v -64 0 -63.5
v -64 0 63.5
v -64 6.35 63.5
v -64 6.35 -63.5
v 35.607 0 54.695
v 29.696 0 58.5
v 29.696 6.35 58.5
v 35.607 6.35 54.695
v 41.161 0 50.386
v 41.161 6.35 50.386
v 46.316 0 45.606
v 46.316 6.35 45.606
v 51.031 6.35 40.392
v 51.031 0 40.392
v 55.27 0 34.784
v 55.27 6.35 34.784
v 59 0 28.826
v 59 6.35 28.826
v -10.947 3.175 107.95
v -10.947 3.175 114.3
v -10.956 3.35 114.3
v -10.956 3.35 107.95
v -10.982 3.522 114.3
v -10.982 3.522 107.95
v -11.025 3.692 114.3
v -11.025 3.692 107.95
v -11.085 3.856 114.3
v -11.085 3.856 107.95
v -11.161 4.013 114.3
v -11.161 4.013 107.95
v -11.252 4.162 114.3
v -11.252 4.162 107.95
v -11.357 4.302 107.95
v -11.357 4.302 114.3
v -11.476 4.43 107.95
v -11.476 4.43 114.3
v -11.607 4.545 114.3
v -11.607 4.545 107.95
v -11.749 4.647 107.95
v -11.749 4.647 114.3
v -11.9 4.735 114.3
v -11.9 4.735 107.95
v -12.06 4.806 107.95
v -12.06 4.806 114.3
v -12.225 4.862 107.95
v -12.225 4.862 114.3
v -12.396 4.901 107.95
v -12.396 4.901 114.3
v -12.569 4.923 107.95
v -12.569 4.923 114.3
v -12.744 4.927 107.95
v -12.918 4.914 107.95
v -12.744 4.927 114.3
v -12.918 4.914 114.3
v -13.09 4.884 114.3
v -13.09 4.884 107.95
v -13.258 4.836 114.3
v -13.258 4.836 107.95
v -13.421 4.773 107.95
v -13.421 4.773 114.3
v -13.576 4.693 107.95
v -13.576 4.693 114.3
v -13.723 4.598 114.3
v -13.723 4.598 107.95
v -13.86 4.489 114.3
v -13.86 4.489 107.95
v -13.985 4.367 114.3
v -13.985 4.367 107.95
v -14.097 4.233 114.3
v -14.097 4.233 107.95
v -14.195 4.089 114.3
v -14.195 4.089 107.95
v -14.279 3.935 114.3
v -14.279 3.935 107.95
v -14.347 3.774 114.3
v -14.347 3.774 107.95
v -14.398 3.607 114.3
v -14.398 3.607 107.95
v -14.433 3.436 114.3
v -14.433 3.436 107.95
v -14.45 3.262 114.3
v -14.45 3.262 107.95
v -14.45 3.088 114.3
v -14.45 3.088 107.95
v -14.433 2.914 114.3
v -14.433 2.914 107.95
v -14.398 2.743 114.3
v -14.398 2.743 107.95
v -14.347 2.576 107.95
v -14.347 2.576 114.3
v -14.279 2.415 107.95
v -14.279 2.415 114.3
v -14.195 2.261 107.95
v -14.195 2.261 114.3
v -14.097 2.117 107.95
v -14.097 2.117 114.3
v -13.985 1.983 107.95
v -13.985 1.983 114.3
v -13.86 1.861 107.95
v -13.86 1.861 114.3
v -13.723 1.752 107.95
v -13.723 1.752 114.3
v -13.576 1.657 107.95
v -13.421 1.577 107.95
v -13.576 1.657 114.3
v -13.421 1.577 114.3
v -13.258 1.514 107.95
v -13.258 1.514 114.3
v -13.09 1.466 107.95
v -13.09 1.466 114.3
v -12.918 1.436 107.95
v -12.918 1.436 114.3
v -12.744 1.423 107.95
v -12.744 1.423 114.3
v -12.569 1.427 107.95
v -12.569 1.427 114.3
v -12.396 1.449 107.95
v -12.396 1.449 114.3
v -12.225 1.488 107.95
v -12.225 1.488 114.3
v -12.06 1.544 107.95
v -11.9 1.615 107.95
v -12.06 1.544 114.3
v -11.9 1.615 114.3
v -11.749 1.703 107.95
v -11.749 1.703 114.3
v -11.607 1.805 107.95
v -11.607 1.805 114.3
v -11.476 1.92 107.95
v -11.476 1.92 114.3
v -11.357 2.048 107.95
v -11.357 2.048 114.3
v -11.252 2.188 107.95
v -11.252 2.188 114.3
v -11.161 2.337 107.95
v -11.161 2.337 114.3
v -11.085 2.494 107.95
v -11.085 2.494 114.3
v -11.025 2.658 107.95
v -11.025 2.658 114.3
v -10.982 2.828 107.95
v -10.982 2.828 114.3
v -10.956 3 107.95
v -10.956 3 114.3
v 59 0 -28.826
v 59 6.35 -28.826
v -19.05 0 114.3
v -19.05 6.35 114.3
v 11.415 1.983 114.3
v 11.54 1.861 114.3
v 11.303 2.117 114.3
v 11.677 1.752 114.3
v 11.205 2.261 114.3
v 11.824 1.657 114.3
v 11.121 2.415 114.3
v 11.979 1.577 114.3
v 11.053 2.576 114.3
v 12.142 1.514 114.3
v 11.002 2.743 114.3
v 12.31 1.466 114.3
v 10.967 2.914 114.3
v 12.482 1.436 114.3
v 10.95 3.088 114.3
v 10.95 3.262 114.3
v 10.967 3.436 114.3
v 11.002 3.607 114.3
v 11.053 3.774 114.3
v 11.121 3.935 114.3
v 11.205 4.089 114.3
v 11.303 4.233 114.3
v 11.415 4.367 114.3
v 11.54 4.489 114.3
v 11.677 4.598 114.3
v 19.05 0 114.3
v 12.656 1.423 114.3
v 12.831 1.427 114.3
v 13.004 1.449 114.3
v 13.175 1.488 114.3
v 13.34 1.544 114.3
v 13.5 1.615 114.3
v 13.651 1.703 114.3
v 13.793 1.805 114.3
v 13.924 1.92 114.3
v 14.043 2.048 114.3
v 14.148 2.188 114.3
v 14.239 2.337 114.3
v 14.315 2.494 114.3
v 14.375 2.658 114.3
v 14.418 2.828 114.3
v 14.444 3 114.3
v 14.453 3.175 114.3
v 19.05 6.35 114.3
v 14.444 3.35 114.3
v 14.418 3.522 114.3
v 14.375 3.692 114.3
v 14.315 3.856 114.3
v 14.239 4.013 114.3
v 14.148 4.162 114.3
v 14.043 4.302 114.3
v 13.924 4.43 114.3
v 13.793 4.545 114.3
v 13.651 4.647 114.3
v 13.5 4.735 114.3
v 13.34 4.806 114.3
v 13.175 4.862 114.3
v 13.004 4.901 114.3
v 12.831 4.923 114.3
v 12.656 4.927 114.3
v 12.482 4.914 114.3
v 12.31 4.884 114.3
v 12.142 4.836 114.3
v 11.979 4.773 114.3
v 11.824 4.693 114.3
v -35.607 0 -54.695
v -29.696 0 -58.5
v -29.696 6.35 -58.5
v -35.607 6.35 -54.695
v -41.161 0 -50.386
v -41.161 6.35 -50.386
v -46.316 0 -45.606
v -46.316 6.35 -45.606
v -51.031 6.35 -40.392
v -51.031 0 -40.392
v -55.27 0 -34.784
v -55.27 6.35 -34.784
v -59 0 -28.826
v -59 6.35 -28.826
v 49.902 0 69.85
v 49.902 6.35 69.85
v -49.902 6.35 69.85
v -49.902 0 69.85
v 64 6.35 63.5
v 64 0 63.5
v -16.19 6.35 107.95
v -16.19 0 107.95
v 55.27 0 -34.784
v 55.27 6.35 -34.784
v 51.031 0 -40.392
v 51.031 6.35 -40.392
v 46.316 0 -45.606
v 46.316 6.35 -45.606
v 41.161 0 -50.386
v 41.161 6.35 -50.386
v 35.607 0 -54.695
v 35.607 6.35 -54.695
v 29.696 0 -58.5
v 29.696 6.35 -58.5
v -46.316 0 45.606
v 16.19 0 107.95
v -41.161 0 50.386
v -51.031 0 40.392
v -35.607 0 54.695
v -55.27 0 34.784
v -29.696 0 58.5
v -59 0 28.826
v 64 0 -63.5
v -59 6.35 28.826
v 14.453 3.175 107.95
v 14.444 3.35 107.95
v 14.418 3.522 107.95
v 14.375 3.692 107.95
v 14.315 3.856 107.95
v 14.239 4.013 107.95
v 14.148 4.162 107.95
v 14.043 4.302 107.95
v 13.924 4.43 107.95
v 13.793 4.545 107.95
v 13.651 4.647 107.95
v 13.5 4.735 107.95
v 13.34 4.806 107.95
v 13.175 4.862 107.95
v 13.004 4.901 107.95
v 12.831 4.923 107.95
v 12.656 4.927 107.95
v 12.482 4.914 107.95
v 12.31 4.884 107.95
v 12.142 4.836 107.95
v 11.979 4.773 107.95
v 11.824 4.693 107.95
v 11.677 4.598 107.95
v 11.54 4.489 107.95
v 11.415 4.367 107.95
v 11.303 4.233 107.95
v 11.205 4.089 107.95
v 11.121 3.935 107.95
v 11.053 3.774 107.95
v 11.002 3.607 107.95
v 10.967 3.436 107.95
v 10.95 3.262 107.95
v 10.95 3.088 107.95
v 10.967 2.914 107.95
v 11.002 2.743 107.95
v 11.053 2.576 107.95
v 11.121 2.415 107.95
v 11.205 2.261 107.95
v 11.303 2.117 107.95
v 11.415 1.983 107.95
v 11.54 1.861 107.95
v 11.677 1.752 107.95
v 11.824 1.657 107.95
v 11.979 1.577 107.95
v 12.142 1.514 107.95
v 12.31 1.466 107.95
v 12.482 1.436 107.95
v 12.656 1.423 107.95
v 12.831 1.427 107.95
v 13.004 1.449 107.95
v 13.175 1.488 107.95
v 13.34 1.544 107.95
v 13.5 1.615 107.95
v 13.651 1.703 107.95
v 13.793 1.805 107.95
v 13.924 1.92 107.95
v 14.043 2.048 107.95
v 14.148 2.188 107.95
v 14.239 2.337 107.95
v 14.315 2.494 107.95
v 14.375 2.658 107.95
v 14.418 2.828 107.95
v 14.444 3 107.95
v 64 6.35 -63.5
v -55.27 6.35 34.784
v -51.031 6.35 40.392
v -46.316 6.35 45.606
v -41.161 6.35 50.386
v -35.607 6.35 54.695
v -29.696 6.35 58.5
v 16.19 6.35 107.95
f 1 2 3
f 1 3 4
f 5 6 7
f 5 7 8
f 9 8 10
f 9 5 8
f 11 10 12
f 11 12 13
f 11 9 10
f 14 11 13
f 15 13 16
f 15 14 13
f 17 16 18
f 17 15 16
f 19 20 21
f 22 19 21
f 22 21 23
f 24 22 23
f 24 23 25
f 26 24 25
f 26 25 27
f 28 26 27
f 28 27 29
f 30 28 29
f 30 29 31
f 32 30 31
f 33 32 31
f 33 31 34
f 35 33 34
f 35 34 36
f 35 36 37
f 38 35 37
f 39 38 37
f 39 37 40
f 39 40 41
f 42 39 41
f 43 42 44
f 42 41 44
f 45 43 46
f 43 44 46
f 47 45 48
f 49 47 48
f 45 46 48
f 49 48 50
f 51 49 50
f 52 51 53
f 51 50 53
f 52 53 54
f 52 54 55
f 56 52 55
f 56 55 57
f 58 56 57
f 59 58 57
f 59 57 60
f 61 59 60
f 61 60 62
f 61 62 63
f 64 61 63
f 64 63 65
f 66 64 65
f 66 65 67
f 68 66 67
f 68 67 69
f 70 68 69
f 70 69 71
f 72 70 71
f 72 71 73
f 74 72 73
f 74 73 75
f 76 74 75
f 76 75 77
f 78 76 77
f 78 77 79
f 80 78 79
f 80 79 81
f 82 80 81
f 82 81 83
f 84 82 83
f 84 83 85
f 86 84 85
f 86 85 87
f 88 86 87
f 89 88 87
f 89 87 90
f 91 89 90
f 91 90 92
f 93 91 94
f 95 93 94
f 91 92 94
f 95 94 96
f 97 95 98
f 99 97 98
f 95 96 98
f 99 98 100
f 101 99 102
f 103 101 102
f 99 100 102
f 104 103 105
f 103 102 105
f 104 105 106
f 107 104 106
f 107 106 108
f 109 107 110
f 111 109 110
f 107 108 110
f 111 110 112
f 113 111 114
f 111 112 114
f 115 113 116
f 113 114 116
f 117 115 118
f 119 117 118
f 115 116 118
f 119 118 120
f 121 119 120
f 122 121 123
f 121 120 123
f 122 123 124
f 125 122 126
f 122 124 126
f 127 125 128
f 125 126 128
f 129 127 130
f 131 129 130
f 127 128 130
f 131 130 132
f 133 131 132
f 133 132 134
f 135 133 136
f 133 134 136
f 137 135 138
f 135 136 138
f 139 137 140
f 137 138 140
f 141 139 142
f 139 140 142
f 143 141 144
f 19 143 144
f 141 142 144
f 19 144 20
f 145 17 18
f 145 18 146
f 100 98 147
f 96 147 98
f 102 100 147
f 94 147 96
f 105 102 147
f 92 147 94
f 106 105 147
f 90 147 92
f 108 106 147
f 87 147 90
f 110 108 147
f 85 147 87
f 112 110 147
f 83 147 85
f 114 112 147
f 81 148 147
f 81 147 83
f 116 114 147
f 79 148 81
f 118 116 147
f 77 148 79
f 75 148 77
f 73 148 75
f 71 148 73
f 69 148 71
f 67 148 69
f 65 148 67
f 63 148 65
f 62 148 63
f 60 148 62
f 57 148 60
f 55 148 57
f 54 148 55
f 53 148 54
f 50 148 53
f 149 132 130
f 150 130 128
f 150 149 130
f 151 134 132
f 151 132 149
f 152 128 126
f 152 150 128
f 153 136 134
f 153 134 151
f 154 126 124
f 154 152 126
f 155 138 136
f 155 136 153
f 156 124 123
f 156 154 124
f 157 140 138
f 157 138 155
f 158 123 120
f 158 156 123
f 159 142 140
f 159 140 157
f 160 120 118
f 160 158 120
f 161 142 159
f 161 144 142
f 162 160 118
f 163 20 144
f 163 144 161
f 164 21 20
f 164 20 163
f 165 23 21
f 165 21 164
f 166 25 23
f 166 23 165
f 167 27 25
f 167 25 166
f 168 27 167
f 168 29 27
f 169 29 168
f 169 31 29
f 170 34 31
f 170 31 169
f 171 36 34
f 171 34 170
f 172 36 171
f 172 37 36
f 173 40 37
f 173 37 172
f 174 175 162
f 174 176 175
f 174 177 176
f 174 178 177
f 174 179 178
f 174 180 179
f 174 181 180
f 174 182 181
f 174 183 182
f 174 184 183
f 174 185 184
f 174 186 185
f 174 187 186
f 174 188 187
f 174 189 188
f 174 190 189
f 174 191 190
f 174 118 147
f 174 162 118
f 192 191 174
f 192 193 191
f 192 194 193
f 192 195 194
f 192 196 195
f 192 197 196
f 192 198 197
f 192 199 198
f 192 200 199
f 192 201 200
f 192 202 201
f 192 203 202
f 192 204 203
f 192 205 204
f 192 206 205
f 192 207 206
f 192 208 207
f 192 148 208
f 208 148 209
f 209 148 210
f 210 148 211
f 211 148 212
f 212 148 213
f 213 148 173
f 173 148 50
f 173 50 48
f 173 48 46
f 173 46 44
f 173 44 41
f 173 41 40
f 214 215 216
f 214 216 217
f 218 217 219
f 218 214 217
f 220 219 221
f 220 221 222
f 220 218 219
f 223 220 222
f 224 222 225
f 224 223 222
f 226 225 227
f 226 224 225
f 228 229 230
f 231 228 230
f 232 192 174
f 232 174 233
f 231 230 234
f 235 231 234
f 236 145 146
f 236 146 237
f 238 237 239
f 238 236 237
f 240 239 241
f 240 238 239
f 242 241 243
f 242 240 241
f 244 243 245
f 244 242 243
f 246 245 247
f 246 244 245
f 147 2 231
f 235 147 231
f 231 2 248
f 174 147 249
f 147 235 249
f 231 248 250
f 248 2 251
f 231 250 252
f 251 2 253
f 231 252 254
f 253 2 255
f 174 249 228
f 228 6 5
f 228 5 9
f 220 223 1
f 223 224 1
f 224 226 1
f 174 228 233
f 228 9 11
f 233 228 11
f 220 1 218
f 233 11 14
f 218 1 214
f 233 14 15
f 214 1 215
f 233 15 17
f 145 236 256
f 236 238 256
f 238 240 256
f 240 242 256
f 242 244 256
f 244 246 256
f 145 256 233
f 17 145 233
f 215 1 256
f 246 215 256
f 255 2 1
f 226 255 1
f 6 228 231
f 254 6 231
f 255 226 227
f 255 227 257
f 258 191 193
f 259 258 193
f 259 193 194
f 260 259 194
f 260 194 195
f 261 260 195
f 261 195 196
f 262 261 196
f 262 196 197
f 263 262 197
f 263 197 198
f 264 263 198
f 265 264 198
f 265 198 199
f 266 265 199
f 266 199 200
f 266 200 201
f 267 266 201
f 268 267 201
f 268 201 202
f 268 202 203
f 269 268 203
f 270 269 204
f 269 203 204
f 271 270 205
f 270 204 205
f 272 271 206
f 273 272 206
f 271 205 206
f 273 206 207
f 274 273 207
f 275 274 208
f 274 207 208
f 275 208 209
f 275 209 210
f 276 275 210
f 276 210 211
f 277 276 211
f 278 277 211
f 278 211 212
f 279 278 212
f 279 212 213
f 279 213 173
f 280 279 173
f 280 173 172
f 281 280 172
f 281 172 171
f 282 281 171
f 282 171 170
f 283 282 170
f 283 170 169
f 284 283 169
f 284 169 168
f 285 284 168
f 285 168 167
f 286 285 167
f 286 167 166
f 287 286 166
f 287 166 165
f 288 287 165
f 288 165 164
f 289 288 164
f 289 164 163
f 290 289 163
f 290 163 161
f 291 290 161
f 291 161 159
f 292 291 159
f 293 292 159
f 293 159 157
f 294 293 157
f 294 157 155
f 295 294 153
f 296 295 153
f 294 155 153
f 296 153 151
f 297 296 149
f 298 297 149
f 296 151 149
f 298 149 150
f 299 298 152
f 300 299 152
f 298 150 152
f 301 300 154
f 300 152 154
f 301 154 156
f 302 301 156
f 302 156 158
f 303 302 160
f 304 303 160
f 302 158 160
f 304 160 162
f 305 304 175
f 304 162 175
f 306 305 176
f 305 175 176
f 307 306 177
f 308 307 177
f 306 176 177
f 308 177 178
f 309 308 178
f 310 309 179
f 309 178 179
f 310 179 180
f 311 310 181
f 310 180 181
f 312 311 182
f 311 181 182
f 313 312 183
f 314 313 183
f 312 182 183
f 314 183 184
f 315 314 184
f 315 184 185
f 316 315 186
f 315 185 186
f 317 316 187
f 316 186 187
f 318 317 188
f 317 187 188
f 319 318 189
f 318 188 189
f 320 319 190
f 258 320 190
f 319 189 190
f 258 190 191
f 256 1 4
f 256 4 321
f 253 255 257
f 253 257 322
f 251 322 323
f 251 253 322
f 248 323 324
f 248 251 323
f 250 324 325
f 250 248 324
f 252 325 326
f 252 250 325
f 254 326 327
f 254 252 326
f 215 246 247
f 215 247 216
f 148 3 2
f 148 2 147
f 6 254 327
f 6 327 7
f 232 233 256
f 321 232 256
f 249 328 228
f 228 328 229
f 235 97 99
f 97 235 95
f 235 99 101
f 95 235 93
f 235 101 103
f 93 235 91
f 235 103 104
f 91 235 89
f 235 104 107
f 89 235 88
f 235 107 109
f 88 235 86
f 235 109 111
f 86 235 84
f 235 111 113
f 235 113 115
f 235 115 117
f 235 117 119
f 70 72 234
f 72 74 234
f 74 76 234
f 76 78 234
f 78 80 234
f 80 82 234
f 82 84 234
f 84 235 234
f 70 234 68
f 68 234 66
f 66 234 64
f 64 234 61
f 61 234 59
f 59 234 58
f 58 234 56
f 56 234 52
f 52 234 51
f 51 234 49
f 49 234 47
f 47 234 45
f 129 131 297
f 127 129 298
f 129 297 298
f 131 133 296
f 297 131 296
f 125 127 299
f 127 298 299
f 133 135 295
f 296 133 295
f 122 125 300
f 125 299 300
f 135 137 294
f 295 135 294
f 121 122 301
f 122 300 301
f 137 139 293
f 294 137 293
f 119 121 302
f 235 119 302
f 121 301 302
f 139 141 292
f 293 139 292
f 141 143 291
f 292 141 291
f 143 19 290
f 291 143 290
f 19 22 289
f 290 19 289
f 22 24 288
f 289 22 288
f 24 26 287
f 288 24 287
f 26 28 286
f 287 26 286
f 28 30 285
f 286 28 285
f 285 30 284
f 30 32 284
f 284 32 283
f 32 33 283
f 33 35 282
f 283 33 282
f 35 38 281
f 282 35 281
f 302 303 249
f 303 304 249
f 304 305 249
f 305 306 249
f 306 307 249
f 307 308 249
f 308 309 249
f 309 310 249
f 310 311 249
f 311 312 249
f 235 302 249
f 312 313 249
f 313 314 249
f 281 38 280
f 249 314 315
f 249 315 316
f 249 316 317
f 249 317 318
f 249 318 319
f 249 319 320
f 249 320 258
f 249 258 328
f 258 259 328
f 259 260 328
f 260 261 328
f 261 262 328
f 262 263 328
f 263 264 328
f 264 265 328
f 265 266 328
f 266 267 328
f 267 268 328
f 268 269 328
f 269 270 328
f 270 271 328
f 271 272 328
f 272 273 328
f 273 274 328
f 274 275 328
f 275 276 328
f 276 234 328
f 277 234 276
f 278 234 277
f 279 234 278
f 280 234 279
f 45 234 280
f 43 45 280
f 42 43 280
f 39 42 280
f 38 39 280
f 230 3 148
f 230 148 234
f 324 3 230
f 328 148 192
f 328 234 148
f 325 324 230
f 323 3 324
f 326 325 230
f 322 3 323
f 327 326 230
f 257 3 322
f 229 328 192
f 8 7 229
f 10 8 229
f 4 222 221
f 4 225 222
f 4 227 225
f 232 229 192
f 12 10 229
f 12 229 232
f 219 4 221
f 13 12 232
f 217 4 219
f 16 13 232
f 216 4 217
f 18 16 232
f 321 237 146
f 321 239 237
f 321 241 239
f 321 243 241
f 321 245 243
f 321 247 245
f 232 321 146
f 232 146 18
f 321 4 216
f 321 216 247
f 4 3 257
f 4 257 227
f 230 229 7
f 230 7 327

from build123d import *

# Parameters (mm, degrees)
SKETCH2_W                       = 128
SKETCH2_H                       = 127
BOSS_EXTRUDE1_DEPTH             = 6.35
BOSS_EXTRUDE2_DEPTH             = 6.35
F_6_32_TAPPED_HOLE1_D           = 2.7051
F_6_32_TAPPED_HOLE1_DEPTH       = 9.398
F_6_32_TAPPED_HOLE1_CBORE_D     = 3.5052
F_6_32_TAPPED_HOLE1_CBORE_DEPTH = 7.112
F_6_32_TAPPED_HOLE1_TIP         = 0.81269403


with BuildPart() as part:
    # Sketch2 → Boss-Extrude1 (new body)
    with BuildSketch(Plane(origin=(0, 0, 0), x_dir=(1, 0, 0), z_dir=(0, 1, 0))):
        Rectangle(SKETCH2_W, SKETCH2_H)
        with BuildLine():
            Line((29.695725746, 58.5), (-29.695725746, 58.5))
            ThreePointArc((-29.695725746, 58.5), (-46.315550876, 45.606106313), (-59, 28.825884855))
            Line((-59, 28.825884855), (-59, -28.825884855))
            ThreePointArc((-59, -28.825884855), (-46.315550876, -45.606106313), (-29.695725746, -58.5))
            Line((-29.695725746, -58.5), (29.695725746, -58.5))
            ThreePointArc((29.695725746, -58.5), (46.315550876, -45.606106313), (59, -28.825884855))
            Line((59, -28.825884855), (59, 28.825884855))
            ThreePointArc((59, 28.825884855), (46.315550876, 45.606106313), (29.695725746, 58.5))
        make_face(mode=Mode.SUBTRACT)
    extrude(amount=BOSS_EXTRUDE1_DEPTH)

    # Sketch3 → Boss-Extrude2 (add)
    with BuildSketch(Plane(origin=(0, 6.35, 0), x_dir=(1, 0, 0), z_dir=(0, 1, 0))):
        Polygon((-64, -63.5), (-19.05, -114.3), (19.05, -114.3), (64, -63.5), align=None)
        Polygon((-49.902284759, -69.85), (-16.189784759, -107.95), (16.189784759, -107.95), (49.902284759, -69.85), align=None, mode=Mode.SUBTRACT)
    extrude(amount=-BOSS_EXTRUDE2_DEPTH)

    # #6-32 Tapped Hole1
    with Locations(Plane.XY.offset(114.3)):
        with Locations((-12.7, 3.175), (12.7, 3.175)):
            CounterBoreHole(F_6_32_TAPPED_HOLE1_D / 2, F_6_32_TAPPED_HOLE1_CBORE_D / 2, F_6_32_TAPPED_HOLE1_CBORE_DEPTH, depth=F_6_32_TAPPED_HOLE1_DEPTH)
            with Locations((0, 0, -(F_6_32_TAPPED_HOLE1_DEPTH + F_6_32_TAPPED_HOLE1_TIP / 2))):  # 118° drill point
                Cone(0, F_6_32_TAPPED_HOLE1_D / 2, F_6_32_TAPPED_HOLE1_TIP, mode=Mode.SUBTRACT)


solid = part.part
